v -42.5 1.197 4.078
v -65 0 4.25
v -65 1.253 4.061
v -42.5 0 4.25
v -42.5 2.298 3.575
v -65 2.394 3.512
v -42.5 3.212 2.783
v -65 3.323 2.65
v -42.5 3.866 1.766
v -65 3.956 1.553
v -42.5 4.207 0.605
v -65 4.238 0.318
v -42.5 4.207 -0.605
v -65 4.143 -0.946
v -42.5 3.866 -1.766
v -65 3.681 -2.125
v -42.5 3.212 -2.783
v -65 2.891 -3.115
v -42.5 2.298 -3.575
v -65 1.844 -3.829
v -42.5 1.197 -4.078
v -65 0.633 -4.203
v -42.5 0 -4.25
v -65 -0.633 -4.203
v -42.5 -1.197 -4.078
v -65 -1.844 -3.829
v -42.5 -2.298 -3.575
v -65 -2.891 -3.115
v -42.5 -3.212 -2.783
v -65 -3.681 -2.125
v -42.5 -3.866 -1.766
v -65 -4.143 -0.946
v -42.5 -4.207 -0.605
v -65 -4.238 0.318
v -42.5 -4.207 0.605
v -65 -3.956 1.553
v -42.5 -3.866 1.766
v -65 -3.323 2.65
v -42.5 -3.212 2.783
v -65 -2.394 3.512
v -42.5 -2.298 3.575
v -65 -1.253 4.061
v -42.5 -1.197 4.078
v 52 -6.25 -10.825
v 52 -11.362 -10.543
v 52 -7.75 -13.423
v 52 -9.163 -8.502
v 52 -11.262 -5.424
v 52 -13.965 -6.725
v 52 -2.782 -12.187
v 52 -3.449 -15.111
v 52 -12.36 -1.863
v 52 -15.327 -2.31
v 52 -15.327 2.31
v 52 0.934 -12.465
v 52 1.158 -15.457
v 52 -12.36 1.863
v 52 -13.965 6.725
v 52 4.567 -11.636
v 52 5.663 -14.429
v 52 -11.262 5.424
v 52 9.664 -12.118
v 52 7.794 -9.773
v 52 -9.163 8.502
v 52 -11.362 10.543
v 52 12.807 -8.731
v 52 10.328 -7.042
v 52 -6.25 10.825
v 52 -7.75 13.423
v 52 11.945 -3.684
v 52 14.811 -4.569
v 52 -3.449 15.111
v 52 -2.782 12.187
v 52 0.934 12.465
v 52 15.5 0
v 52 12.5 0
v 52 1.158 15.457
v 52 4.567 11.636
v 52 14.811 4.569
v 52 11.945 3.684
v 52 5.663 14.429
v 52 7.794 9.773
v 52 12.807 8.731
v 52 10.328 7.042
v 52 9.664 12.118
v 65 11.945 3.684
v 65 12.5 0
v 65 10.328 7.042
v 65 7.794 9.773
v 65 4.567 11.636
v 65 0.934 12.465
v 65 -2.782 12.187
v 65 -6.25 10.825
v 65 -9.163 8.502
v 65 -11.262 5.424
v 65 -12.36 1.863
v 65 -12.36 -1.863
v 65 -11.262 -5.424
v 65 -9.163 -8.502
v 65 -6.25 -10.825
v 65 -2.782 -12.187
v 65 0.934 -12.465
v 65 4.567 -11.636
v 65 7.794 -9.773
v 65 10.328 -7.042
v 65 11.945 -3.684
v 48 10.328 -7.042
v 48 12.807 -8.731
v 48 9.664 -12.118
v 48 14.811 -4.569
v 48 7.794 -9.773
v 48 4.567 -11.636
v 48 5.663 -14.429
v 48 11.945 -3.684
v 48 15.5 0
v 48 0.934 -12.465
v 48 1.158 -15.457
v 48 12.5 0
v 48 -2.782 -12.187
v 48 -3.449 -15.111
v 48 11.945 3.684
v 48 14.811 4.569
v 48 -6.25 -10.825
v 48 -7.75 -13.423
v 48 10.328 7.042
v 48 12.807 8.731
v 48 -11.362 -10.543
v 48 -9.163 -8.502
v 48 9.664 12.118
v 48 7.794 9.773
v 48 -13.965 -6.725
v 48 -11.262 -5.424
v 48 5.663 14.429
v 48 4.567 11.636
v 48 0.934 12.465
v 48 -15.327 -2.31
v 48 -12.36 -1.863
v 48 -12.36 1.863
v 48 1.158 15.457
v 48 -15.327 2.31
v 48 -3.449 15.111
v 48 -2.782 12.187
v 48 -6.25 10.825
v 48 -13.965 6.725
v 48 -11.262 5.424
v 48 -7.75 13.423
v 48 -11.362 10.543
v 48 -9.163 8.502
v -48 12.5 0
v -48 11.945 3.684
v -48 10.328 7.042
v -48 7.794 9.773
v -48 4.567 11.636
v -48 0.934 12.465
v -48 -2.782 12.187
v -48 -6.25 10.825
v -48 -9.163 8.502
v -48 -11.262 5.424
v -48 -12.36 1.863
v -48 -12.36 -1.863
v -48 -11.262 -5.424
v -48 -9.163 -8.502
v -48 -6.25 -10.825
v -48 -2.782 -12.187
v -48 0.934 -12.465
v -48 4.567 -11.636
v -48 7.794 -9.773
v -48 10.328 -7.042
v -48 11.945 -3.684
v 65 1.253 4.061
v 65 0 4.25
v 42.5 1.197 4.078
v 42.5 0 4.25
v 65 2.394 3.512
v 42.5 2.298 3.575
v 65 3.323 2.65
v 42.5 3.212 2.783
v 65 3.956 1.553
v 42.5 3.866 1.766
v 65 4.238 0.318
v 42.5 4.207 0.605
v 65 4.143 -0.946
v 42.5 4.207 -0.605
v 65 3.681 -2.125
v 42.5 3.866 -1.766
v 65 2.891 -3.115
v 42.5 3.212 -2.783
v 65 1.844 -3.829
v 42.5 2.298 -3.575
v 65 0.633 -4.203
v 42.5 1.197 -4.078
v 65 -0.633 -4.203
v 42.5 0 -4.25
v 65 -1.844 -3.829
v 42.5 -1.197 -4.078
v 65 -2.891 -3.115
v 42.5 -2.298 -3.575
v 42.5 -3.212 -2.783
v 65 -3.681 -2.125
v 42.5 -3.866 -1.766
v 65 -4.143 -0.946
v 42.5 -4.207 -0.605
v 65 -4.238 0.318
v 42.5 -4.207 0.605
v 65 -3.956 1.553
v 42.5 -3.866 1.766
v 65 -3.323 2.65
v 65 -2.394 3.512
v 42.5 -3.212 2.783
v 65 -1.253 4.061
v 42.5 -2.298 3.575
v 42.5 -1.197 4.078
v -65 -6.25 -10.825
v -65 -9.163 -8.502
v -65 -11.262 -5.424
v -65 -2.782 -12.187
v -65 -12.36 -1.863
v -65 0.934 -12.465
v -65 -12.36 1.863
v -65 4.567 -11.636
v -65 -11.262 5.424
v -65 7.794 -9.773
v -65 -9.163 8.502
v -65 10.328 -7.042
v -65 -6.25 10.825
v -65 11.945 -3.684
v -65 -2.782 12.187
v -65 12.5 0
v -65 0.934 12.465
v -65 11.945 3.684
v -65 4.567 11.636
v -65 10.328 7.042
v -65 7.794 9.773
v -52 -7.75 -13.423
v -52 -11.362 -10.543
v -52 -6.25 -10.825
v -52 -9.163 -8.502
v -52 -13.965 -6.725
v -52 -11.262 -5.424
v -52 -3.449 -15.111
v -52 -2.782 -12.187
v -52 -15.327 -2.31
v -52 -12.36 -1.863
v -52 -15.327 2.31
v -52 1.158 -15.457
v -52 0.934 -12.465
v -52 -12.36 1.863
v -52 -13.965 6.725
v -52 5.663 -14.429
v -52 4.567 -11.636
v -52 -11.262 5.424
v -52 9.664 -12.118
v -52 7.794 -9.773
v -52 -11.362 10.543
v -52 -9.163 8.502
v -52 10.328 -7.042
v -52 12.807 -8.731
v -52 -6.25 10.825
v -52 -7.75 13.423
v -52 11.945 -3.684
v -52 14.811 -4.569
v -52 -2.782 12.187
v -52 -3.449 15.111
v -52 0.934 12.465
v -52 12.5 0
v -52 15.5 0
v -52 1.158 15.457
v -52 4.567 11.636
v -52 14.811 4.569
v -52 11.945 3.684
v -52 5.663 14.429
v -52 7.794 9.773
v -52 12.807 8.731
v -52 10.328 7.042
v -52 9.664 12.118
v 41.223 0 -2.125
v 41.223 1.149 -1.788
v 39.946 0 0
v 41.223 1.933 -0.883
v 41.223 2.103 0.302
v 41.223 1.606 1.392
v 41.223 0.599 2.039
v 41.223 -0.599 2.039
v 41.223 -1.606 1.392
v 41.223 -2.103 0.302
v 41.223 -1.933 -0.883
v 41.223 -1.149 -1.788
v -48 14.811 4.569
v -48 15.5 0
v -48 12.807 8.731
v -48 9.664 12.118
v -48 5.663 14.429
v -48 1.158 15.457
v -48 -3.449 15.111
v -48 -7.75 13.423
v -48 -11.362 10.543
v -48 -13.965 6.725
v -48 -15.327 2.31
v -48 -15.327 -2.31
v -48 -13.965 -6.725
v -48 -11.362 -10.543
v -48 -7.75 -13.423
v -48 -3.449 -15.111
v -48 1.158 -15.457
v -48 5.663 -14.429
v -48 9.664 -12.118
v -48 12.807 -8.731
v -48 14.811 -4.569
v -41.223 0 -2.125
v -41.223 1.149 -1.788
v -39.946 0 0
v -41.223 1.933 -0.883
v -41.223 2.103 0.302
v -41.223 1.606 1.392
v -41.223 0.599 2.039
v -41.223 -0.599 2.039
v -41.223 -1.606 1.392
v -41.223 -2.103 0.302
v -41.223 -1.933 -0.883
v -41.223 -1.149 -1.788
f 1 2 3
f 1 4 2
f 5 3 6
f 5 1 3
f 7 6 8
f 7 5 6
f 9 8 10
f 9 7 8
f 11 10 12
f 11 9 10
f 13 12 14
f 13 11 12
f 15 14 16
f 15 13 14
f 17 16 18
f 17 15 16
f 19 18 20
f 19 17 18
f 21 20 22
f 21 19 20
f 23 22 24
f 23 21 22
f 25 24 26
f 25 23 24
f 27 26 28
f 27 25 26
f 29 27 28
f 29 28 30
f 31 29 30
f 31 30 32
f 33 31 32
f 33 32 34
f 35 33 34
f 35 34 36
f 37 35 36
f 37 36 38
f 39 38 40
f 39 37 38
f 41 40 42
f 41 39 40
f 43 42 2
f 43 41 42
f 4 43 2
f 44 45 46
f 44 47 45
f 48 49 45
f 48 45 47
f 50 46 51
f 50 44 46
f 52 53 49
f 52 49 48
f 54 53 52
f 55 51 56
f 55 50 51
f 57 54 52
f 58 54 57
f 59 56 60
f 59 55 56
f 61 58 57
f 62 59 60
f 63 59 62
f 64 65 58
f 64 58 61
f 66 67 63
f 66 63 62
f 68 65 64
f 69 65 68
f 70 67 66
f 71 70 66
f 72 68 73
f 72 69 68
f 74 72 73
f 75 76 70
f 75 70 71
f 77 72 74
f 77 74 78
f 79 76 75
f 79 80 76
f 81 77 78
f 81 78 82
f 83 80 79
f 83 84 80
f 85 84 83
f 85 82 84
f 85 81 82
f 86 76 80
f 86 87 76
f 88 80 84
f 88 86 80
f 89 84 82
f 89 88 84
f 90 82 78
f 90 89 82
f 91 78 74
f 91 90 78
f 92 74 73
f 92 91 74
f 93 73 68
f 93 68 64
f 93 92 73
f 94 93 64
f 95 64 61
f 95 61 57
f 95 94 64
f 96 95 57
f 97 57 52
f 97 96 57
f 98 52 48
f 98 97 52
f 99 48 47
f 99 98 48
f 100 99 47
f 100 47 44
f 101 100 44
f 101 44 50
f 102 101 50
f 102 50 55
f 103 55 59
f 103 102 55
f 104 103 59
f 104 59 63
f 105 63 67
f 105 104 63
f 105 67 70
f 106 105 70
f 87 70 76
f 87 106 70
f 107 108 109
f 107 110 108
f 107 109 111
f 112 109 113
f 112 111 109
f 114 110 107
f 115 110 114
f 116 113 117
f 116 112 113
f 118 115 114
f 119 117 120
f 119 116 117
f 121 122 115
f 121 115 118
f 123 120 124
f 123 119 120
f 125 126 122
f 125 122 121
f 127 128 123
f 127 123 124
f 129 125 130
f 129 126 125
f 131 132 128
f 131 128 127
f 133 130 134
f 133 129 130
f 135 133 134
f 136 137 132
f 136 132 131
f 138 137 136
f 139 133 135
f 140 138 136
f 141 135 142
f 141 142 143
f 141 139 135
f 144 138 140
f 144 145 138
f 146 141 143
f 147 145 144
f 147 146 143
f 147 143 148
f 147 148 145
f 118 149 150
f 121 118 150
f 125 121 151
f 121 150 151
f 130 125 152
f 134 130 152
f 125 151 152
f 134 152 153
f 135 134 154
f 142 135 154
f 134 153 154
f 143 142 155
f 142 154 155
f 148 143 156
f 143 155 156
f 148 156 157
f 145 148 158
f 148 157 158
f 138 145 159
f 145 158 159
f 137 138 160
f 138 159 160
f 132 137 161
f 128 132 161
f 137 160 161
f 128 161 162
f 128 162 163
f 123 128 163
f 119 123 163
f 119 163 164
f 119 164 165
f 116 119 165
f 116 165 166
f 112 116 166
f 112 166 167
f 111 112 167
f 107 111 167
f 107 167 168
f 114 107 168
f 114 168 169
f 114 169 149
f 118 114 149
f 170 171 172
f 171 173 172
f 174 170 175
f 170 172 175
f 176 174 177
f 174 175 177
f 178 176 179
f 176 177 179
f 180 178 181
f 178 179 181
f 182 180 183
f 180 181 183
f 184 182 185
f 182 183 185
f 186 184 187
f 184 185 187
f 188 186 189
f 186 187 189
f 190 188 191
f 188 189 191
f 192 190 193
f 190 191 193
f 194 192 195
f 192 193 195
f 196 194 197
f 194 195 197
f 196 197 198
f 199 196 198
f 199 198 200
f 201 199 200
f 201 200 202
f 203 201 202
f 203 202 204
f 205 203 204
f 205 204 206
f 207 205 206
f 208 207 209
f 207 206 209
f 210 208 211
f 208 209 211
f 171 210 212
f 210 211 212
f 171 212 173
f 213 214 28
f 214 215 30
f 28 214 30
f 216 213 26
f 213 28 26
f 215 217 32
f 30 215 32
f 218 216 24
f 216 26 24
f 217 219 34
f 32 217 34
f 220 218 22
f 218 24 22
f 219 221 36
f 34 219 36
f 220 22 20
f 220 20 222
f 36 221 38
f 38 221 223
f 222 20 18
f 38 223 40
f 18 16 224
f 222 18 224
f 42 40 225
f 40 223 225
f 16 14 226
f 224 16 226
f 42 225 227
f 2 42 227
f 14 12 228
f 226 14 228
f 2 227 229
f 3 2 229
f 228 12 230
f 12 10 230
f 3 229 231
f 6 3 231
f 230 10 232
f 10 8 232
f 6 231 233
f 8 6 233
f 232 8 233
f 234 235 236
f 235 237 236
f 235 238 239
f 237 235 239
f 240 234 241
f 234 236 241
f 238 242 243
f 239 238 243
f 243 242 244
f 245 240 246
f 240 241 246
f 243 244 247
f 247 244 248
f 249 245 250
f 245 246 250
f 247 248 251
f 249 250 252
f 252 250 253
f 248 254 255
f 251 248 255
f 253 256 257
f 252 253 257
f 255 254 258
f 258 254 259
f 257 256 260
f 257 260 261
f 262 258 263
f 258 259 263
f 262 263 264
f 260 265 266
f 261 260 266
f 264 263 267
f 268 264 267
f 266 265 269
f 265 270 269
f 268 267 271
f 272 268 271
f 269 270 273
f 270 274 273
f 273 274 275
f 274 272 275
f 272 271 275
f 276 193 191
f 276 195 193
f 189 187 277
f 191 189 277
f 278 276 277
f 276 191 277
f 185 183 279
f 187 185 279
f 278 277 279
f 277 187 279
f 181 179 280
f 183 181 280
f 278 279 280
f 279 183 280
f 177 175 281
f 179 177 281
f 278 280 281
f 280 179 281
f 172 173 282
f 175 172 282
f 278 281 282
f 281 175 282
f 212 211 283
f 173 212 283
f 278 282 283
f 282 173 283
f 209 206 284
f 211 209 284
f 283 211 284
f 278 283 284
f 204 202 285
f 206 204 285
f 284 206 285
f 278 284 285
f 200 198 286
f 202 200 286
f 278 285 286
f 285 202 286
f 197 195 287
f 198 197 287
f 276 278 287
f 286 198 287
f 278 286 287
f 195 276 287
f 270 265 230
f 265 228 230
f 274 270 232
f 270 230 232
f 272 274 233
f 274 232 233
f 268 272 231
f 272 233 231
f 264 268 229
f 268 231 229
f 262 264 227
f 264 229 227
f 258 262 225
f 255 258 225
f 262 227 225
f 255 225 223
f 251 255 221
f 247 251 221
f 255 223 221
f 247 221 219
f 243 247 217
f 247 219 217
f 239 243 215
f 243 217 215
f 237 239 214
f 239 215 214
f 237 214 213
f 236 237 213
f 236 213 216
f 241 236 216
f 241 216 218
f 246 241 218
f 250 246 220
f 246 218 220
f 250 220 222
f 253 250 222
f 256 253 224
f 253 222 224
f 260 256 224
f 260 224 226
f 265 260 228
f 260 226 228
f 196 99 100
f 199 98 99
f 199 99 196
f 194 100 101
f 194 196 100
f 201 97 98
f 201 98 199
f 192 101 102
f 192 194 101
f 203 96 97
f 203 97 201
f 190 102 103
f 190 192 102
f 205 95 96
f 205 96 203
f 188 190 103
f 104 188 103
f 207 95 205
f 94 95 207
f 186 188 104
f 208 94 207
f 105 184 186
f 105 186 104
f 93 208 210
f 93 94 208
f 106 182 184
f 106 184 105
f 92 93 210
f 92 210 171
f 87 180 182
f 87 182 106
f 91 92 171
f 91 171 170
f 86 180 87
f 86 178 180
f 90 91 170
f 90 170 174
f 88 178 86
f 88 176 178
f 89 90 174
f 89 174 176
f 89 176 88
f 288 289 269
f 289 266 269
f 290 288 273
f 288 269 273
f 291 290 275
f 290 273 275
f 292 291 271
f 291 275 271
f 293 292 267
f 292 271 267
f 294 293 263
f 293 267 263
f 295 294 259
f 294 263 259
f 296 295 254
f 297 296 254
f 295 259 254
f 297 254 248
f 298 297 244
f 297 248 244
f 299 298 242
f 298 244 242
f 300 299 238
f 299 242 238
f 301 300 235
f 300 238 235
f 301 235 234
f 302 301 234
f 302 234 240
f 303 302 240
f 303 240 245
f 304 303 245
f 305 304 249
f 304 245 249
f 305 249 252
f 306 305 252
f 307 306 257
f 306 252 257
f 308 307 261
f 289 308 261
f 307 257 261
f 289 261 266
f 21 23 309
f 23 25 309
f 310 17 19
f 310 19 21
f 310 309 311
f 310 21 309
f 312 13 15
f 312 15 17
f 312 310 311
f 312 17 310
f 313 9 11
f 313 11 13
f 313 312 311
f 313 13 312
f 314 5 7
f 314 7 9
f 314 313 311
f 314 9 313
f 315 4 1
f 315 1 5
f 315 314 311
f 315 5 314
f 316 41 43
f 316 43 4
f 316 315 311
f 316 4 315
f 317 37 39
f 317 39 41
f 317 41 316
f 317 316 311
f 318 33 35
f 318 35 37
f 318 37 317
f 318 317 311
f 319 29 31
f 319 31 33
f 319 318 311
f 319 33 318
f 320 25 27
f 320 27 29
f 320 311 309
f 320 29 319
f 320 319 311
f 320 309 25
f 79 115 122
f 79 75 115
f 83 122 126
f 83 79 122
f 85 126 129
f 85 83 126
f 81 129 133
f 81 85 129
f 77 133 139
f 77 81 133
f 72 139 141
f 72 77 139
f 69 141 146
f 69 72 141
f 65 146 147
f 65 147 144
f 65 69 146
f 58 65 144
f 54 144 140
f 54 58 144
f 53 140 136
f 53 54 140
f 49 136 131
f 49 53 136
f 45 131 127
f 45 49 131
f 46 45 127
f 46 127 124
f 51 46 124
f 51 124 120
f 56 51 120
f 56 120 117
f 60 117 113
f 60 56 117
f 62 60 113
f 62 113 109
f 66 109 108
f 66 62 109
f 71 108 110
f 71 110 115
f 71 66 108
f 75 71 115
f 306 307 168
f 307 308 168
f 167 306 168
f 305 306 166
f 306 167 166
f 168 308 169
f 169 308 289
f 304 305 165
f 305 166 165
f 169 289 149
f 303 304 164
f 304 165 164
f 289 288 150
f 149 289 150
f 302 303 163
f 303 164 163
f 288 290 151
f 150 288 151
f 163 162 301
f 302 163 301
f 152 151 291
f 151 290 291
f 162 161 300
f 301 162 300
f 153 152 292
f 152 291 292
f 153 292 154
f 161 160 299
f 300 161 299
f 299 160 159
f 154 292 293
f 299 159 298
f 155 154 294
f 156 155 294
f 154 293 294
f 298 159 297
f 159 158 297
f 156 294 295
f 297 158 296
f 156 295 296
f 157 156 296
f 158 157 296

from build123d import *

# Parameters (mm, degrees)
HOLE_WIZARD_M101_D     = 8.5
HOLE_WIZARD_M101_DEPTH = 22.5
HOLE_WIZARD_M101_TIP   = 2.553657631


with BuildPart() as part:
    # Эскиз1 → Повернуть1 (revolve)
    with BuildSketch(Plane.XY):
        Polygon((0, 0), (0, 12.5), (48, 12.5), (48, 15.5), (52, 15.5), (52, 12.5), (65, 12.5), (65, 0), align=None)
    revolve(axis=Axis((-1000, 0, 0), (1, 0, 0)))

    # Отверстие обработанное метчиком M101
    with Locations(Plane(origin=(65, 0, 0), x_dir=(0, 0, -1), z_dir=(1, 0, 0))):
        with Locations((0, 0)):
            Hole(HOLE_WIZARD_M101_D / 2, depth=HOLE_WIZARD_M101_DEPTH)
            with Locations((0, 0, -(HOLE_WIZARD_M101_DEPTH + HOLE_WIZARD_M101_TIP / 2))):  # 118° drill point
                Cone(0, HOLE_WIZARD_M101_D / 2, HOLE_WIZARD_M101_TIP, mode=Mode.SUBTRACT)

    # Зеркальное отражение1: part across plane


with BuildPart() as part_1:
    add(part.part)
    add(part.part.mirror(Plane(origin=(0, 0, 0), x_dir=(0, 0, 1), z_dir=(1, 0, 0))))


solid = part_1.part
